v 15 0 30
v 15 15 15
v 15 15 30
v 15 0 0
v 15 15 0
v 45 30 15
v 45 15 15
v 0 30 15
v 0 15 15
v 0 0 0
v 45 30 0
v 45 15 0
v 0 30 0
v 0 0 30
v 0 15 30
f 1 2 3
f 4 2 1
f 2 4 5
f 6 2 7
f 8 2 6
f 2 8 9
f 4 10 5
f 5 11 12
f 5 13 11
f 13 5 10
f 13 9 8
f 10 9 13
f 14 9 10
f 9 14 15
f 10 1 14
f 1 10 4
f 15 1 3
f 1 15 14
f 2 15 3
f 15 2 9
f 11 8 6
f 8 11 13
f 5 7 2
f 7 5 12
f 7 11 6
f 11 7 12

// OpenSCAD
// Fongo piece 14: Upright hook. GPL-3.0; see README.txt.
// All cube positions derive from the canonical catalogue. z points up.
unit = 15; // mm, scale all pieces AND cards together
positions = [[0,0,0],[0,0,1],[0,1,0],[1,1,0],[2,1,0]];
union() { for (p = positions) translate(p * unit) cube([unit, unit, unit]); }
